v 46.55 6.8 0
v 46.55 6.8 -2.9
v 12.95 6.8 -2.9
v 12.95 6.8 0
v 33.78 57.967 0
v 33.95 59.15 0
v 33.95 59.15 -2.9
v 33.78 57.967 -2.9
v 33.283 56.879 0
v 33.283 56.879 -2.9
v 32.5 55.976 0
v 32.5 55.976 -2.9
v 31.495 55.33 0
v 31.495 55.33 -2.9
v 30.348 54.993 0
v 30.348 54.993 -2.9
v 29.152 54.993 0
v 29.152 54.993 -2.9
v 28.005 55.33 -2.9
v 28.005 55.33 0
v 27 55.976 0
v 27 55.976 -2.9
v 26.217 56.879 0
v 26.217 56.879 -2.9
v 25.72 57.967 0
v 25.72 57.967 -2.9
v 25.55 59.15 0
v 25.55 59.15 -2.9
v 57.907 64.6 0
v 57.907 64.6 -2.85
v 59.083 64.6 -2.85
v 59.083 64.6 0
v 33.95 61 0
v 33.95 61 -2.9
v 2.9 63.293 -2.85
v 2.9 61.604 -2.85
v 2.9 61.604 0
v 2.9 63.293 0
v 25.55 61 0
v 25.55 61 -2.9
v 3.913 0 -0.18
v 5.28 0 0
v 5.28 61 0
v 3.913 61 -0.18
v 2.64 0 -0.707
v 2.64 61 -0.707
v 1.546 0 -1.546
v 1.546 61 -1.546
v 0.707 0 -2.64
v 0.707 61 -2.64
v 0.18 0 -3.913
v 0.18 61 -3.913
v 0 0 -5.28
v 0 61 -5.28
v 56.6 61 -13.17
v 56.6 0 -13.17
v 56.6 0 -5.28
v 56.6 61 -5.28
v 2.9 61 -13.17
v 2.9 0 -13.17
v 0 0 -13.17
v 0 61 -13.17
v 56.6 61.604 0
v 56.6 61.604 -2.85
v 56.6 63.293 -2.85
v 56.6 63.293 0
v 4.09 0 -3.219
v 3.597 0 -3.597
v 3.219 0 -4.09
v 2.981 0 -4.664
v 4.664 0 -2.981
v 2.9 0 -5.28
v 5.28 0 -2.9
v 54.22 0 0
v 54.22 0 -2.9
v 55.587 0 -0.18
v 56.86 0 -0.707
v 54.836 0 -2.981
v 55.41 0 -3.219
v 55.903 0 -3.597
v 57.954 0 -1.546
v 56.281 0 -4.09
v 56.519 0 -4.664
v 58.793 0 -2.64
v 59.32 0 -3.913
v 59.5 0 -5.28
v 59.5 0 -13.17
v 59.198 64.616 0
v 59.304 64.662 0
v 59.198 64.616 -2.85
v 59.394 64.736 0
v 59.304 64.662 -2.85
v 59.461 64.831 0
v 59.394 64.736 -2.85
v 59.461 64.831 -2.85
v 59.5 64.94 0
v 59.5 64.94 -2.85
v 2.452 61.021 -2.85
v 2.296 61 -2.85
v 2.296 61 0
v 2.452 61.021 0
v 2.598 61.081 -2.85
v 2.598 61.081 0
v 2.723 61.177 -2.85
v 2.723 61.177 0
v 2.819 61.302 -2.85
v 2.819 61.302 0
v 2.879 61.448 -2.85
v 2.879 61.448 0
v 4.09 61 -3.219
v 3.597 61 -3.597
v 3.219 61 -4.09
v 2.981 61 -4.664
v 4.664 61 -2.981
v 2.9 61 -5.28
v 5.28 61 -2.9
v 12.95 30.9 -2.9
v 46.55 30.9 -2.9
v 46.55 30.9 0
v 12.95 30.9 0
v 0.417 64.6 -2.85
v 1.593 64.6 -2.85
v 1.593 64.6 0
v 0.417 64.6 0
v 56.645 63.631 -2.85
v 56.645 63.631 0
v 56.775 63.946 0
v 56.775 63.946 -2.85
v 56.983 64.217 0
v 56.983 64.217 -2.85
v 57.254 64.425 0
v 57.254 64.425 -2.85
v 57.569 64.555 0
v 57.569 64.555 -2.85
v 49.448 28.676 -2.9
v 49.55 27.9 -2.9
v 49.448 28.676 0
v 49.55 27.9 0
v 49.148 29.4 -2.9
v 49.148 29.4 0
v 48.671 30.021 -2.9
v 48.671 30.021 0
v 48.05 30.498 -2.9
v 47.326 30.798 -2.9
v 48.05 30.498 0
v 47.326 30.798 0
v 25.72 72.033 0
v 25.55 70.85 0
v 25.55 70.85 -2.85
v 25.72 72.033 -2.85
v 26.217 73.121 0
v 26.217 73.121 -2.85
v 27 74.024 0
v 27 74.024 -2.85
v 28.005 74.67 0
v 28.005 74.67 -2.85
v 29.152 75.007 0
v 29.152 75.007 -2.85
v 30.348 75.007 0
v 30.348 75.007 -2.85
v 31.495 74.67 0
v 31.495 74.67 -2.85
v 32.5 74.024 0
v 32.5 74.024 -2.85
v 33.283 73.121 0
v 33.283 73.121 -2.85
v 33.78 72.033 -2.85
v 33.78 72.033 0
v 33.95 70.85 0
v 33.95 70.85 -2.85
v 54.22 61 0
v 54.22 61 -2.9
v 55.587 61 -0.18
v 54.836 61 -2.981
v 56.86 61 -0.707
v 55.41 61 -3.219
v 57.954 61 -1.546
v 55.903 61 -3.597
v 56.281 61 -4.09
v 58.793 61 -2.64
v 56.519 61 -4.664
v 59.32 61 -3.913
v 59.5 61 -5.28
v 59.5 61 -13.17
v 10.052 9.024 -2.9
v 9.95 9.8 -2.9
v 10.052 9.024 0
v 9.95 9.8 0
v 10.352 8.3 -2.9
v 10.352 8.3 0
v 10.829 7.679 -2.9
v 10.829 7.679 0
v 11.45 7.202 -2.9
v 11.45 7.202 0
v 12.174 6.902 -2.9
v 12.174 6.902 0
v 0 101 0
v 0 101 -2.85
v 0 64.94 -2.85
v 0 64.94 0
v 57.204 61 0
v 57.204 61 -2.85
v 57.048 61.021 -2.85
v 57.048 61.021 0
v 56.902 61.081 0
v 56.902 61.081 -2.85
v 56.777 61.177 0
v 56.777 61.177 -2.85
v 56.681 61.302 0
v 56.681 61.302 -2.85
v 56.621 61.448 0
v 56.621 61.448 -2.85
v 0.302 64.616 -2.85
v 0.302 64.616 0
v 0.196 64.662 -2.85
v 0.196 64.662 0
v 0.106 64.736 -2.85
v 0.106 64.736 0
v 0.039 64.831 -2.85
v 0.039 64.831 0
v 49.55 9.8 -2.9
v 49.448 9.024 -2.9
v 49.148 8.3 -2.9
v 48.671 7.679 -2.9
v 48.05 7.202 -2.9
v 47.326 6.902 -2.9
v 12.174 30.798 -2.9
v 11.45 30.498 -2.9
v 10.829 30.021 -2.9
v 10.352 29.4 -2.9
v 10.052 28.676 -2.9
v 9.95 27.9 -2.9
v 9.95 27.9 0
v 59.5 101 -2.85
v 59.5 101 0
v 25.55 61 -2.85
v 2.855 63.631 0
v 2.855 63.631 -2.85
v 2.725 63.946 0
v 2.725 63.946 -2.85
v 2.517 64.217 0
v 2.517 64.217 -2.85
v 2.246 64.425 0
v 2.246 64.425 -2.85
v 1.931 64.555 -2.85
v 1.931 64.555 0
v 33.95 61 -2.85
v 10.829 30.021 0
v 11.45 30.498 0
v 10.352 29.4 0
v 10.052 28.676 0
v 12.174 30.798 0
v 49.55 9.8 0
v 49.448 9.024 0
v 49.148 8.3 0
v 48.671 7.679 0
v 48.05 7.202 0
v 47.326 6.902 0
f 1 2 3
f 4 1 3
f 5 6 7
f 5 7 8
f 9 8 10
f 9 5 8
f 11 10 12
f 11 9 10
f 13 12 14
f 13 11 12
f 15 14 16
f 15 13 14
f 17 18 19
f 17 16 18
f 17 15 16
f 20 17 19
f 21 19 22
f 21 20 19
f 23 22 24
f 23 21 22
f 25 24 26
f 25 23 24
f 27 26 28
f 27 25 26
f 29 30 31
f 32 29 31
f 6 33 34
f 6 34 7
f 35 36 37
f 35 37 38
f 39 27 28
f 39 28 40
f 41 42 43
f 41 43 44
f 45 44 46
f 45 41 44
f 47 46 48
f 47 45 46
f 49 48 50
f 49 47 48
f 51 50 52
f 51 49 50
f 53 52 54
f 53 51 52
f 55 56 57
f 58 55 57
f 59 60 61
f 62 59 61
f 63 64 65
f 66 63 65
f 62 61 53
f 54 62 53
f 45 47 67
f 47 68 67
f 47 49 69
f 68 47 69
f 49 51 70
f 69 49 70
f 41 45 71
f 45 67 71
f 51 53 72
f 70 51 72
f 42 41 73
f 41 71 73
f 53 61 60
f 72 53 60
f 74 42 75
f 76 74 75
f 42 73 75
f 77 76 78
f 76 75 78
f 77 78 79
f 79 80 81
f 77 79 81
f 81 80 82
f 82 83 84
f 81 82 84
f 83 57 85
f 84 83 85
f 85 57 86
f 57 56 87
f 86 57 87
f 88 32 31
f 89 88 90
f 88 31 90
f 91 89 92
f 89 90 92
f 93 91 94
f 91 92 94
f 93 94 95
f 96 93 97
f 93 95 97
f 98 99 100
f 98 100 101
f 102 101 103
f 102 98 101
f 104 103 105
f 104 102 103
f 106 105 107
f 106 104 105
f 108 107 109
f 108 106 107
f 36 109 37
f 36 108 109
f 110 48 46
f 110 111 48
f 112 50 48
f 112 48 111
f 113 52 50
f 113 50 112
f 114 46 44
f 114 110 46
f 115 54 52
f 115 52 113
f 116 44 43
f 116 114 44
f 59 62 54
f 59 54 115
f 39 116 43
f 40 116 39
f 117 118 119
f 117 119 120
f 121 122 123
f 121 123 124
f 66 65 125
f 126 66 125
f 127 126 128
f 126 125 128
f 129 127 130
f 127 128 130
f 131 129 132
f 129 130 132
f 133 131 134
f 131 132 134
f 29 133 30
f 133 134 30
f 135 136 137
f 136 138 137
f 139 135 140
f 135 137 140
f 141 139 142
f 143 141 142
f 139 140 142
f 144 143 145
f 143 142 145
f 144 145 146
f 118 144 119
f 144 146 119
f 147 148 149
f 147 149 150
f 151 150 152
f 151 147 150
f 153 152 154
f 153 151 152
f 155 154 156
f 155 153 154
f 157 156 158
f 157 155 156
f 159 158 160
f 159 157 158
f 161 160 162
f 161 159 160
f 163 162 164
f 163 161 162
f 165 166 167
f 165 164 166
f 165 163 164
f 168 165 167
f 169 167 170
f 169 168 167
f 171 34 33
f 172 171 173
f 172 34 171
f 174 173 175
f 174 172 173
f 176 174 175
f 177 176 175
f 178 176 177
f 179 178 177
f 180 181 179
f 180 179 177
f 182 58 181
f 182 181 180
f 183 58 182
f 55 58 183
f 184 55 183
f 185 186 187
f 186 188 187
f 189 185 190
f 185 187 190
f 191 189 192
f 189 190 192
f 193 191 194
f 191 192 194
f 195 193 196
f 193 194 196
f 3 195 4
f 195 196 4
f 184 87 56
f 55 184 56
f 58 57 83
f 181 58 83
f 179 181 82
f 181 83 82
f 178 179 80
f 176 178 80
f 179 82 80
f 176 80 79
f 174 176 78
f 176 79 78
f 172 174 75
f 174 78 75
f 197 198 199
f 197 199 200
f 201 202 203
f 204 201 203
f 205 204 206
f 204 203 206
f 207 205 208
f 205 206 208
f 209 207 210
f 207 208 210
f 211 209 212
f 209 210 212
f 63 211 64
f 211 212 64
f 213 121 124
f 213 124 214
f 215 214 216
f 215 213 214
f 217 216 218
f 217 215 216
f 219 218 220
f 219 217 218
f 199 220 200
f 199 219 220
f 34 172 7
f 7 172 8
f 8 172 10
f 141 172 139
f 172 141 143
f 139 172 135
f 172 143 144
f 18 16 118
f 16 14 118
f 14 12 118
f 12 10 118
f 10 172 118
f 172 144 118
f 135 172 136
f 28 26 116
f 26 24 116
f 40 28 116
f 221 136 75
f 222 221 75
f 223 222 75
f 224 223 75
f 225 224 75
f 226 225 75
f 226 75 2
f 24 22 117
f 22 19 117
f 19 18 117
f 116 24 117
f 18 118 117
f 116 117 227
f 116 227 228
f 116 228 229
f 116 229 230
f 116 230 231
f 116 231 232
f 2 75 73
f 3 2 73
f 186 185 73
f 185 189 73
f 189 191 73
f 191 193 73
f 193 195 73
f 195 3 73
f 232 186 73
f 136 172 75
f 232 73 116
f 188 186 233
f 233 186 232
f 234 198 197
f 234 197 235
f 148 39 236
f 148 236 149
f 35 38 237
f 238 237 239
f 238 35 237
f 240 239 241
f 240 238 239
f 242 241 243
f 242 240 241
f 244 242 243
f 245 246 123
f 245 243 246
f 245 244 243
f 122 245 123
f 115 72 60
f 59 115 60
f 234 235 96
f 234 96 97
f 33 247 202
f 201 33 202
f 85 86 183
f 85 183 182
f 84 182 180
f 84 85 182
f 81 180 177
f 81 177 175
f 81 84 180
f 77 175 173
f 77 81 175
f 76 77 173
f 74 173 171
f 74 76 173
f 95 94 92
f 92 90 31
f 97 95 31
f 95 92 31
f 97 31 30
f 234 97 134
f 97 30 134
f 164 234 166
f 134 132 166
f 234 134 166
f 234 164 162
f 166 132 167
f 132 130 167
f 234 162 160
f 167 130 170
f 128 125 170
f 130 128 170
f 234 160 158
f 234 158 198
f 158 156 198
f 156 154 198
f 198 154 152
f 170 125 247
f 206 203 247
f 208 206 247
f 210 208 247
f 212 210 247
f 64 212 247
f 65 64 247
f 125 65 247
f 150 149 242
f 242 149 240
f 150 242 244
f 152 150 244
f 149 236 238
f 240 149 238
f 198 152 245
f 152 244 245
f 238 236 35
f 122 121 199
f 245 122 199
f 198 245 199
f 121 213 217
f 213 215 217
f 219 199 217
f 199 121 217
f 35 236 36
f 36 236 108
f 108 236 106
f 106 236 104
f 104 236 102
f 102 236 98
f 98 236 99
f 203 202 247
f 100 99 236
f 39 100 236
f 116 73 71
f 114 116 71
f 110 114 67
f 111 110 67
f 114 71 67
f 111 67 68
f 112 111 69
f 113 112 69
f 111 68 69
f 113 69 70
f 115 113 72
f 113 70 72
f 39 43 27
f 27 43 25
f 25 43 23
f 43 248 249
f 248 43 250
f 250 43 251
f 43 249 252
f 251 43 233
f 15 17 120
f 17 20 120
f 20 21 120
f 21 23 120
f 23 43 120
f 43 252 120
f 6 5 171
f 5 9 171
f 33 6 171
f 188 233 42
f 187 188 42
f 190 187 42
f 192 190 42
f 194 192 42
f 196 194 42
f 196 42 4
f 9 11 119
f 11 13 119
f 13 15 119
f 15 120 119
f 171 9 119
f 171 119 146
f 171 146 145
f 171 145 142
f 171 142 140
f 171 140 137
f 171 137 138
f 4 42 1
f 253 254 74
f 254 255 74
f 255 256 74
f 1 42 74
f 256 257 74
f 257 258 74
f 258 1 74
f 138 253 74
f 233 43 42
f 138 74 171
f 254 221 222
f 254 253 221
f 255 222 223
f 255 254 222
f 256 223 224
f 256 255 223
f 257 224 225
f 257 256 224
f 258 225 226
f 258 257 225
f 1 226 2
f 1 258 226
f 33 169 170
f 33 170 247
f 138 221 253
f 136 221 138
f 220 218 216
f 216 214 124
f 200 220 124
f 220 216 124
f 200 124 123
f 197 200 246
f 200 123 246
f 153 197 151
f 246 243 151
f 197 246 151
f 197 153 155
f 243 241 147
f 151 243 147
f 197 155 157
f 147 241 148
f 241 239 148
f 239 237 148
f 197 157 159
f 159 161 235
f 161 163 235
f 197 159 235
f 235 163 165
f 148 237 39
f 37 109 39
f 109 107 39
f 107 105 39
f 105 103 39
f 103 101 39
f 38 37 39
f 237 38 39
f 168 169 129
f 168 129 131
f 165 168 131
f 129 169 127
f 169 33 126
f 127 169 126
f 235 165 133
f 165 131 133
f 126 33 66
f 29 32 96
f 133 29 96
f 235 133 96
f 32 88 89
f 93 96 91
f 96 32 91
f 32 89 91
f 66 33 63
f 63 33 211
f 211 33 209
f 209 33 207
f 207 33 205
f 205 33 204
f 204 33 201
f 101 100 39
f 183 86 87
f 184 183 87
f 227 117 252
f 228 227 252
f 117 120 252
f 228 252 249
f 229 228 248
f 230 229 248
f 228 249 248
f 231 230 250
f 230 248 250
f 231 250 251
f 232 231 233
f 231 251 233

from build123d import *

# Parameters (mm, degrees)
BOSS_EXTRUDE1_DEPTH    = 61
BOSS_EXTRUDE2_DEPTH    = 40
CONVERT_SOLID2_DEPTH   = 61
CONVERT_SOLID2_2_DEPTH = 61
CUT_EXTRUDE3_DEPTH     = 118.676473435
SKETCH16_W             = 39.6
SKETCH16_H             = 24.1
CUT_EXTRUDE4_DEPTH     = 118.672099072
FILLET1_R              = 3
CUT_EXTRUDE5_DEPTH     = 118.960581976


# Read off the part's stored shape, not the designer's step: Convert-Solid2
with BuildPart() as part:
    # Sketch1 → Boss-Extrude1 (new body)
    with BuildSketch(Plane(origin=(0, 0, 0), x_dir=(1, 0, 0), z_dir=(0, 1, 0))):
        Polygon((0, 13.17), (0, 0), (59.5, 0), (59.5, 13.17), (56.65, 13.17), (56.65, 2.85), (2.85, 2.85), (2.85, 13.17), align=None)
    extrude(amount=BOSS_EXTRUDE1_DEPTH)

    # Convert-Solid2 outline → Convert-Solid2 (cut)
    with BuildSketch(Plane(origin=(0, 0, 0), x_dir=(1, 0, 0), z_dir=(0, 1, 0))):
        with BuildLine():
            Line((0, 0), (5.280000066, 0))
            ThreePointArc((5.280000066, 0), (1.546476215, 1.546476215), (0, 5.280000066))
            Line((0, 5.280000066), (0, 0))
        make_face()
        with BuildLine():
            Line((54.219999934, 0), (59.5, 0))
            Line((59.5, 0), (59.5, 5.280000066))
            ThreePointArc((59.5, 5.280000066), (57.953523785, 1.546476215), (54.219999934, 0))
        make_face()
    extrude(amount=CONVERT_SOLID2_DEPTH, mode=Mode.SUBTRACT)

    # Convert-Solid2 2 outline → Convert-Solid2 2 (add)
    with BuildSketch(Plane(origin=(0, 0, 0), x_dir=(1, 0, 0), z_dir=(0, 1, 0))):
        with BuildLine():
            Line((2.85, 13.17), (2.85, 2.85))
            Line((2.85, 2.85), (56.65, 2.85))
            Line((56.65, 2.85), (56.65, 13.17))
            Line((56.65, 13.17), (56.6, 13.17))
            Line((56.6, 13.17), (56.6, 5.280000066))
            ThreePointArc((56.6, 5.280000066), (55.90291412, 3.59708588), (54.219999934, 2.9))
            Line((54.219999934, 2.9), (5.280000066, 2.9))
            ThreePointArc((5.280000066, 2.9), (3.59708588, 3.59708588), (2.9, 5.280000066))
            Line((2.9, 5.280000066), (2.9, 13.17))
            Line((2.9, 13.17), (2.85, 13.17))
        make_face()
    extrude(amount=CONVERT_SOLID2_2_DEPTH)

    # Sketch16 → Cut-Extrude4 (cut, through all)
    with BuildSketch(Plane(origin=(0, 0, -2.9), x_dir=(-1, 0, 0), z_dir=(0, 0, -1))):
        with Locations((-29.75, 18.85)):
            Rectangle(SKETCH16_W, SKETCH16_H)
    extrude(amount=-CUT_EXTRUDE4_DEPTH, mode=Mode.SUBTRACT)

    # Fillet1
    fillet1_edges = [part.edges().sort_by_distance(p)[0] for p in [
        (9.95, 30.9, -1.45),
        (9.95, 6.8, -1.45),
        (49.55, 6.8, -1.45),
        (49.55, 30.9, -1.45),
    ]]
    fillet(fillet1_edges, radius=FILLET1_R)


with BuildPart() as body_2:
    # Sketch9 → Boss-Extrude2 (new body)
    with BuildSketch(Plane(origin=(0, 61, 0), x_dir=(1, 0, 0), z_dir=(0, 1, 0))):
        Polygon((2.85, 2.85), (0, 2.85), (0, 0), (59.5, 0), (59.5, 2.85), align=None)
    extrude(amount=BOSS_EXTRUDE2_DEPTH)

    # Sketch14 → Cut-Extrude3 (cut, through all)
    with BuildSketch(Plane(origin=(0, 0, -2.85), x_dir=(-1, 0, 0), z_dir=(0, 0, -1))):
        with BuildLine():
            Line((-59.5, 61), (-57.204121235, 61))
            ThreePointArc((-57.204121235, 61), (-56.776943013, 61.176943013), (-56.6, 61.604121235))
            Line((-56.6, 61.604121235), (-56.6, 63.292565633))
            ThreePointArc((-56.6, 63.292565633), (-56.98293866, 64.21706134), (-57.907434367, 64.6))
            Line((-57.907434367, 64.6), (-59.082936249, 64.6))
            ThreePointArc((-59.082936249, 64.6), (-59.352003791, 64.695793289), (-59.5, 64.940069401))
            Line((-59.5, 64.940069401), (-59.938547492, 64.940069401))
            Line((-59.938547492, 64.940069401), (-59.938547492, 64.6))
            Line((-59.938547492, 64.6), (-59.938547492, 61))
            Line((-59.938547492, 61), (-59.5, 61))
        make_face()
        with BuildLine():
            Line((0, 64.940069401), (0.438547492, 64.940069401))
            Line((0.438547492, 64.940069401), (0.438547492, 64.6))
            Line((0.438547492, 64.6), (0.438547492, 61))
            Line((0.438547492, 61), (0, 61))
            Line((0, 61), (-2.295878765, 61))
            ThreePointArc((-2.295878765, 61), (-2.723056987, 61.176943013), (-2.9, 61.604121235))
            Line((-2.9, 61.604121235), (-2.9, 63.292565633))
            ThreePointArc((-2.9, 63.292565633), (-2.51706134, 64.21706134), (-1.592565633, 64.6))
            Line((-1.592565633, 64.6), (-0.417063751, 64.6))
            ThreePointArc((-0.417063751, 64.6), (-0.147996209, 64.695793289), (0, 64.940069401))
        make_face()
    extrude(amount=-CUT_EXTRUDE3_DEPTH, mode=Mode.SUBTRACT)


with BuildPart() as cut_extrude5_tool:
    # Sketch17 → Cut-Extrude5 (new, through all)
    with BuildSketch(Plane.XY):
        with BuildLine():
            Line((25.55, 59.15), (25.55, 70.85))
            ThreePointArc((25.55, 70.85), (29.75, 75.05), (33.95, 70.85))
            Line((33.95, 70.85), (33.95, 59.15))
            ThreePointArc((33.95, 59.15), (29.75, 54.95), (25.55, 59.15))
        make_face()
    extrude(amount=-CUT_EXTRUDE5_DEPTH)


with BuildPart() as part_1:
    add(part.part)

    # Cut-Extrude5: cut by cut_extrude5_tool
    add(cut_extrude5_tool.part, mode=Mode.SUBTRACT)


with BuildPart() as body_2_1:
    add(body_2.part)

    # Cut-Extrude5: cut by cut_extrude5_tool
    add(cut_extrude5_tool.part, mode=Mode.SUBTRACT)


solid = Compound([part_1.part, body_2_1.part])
